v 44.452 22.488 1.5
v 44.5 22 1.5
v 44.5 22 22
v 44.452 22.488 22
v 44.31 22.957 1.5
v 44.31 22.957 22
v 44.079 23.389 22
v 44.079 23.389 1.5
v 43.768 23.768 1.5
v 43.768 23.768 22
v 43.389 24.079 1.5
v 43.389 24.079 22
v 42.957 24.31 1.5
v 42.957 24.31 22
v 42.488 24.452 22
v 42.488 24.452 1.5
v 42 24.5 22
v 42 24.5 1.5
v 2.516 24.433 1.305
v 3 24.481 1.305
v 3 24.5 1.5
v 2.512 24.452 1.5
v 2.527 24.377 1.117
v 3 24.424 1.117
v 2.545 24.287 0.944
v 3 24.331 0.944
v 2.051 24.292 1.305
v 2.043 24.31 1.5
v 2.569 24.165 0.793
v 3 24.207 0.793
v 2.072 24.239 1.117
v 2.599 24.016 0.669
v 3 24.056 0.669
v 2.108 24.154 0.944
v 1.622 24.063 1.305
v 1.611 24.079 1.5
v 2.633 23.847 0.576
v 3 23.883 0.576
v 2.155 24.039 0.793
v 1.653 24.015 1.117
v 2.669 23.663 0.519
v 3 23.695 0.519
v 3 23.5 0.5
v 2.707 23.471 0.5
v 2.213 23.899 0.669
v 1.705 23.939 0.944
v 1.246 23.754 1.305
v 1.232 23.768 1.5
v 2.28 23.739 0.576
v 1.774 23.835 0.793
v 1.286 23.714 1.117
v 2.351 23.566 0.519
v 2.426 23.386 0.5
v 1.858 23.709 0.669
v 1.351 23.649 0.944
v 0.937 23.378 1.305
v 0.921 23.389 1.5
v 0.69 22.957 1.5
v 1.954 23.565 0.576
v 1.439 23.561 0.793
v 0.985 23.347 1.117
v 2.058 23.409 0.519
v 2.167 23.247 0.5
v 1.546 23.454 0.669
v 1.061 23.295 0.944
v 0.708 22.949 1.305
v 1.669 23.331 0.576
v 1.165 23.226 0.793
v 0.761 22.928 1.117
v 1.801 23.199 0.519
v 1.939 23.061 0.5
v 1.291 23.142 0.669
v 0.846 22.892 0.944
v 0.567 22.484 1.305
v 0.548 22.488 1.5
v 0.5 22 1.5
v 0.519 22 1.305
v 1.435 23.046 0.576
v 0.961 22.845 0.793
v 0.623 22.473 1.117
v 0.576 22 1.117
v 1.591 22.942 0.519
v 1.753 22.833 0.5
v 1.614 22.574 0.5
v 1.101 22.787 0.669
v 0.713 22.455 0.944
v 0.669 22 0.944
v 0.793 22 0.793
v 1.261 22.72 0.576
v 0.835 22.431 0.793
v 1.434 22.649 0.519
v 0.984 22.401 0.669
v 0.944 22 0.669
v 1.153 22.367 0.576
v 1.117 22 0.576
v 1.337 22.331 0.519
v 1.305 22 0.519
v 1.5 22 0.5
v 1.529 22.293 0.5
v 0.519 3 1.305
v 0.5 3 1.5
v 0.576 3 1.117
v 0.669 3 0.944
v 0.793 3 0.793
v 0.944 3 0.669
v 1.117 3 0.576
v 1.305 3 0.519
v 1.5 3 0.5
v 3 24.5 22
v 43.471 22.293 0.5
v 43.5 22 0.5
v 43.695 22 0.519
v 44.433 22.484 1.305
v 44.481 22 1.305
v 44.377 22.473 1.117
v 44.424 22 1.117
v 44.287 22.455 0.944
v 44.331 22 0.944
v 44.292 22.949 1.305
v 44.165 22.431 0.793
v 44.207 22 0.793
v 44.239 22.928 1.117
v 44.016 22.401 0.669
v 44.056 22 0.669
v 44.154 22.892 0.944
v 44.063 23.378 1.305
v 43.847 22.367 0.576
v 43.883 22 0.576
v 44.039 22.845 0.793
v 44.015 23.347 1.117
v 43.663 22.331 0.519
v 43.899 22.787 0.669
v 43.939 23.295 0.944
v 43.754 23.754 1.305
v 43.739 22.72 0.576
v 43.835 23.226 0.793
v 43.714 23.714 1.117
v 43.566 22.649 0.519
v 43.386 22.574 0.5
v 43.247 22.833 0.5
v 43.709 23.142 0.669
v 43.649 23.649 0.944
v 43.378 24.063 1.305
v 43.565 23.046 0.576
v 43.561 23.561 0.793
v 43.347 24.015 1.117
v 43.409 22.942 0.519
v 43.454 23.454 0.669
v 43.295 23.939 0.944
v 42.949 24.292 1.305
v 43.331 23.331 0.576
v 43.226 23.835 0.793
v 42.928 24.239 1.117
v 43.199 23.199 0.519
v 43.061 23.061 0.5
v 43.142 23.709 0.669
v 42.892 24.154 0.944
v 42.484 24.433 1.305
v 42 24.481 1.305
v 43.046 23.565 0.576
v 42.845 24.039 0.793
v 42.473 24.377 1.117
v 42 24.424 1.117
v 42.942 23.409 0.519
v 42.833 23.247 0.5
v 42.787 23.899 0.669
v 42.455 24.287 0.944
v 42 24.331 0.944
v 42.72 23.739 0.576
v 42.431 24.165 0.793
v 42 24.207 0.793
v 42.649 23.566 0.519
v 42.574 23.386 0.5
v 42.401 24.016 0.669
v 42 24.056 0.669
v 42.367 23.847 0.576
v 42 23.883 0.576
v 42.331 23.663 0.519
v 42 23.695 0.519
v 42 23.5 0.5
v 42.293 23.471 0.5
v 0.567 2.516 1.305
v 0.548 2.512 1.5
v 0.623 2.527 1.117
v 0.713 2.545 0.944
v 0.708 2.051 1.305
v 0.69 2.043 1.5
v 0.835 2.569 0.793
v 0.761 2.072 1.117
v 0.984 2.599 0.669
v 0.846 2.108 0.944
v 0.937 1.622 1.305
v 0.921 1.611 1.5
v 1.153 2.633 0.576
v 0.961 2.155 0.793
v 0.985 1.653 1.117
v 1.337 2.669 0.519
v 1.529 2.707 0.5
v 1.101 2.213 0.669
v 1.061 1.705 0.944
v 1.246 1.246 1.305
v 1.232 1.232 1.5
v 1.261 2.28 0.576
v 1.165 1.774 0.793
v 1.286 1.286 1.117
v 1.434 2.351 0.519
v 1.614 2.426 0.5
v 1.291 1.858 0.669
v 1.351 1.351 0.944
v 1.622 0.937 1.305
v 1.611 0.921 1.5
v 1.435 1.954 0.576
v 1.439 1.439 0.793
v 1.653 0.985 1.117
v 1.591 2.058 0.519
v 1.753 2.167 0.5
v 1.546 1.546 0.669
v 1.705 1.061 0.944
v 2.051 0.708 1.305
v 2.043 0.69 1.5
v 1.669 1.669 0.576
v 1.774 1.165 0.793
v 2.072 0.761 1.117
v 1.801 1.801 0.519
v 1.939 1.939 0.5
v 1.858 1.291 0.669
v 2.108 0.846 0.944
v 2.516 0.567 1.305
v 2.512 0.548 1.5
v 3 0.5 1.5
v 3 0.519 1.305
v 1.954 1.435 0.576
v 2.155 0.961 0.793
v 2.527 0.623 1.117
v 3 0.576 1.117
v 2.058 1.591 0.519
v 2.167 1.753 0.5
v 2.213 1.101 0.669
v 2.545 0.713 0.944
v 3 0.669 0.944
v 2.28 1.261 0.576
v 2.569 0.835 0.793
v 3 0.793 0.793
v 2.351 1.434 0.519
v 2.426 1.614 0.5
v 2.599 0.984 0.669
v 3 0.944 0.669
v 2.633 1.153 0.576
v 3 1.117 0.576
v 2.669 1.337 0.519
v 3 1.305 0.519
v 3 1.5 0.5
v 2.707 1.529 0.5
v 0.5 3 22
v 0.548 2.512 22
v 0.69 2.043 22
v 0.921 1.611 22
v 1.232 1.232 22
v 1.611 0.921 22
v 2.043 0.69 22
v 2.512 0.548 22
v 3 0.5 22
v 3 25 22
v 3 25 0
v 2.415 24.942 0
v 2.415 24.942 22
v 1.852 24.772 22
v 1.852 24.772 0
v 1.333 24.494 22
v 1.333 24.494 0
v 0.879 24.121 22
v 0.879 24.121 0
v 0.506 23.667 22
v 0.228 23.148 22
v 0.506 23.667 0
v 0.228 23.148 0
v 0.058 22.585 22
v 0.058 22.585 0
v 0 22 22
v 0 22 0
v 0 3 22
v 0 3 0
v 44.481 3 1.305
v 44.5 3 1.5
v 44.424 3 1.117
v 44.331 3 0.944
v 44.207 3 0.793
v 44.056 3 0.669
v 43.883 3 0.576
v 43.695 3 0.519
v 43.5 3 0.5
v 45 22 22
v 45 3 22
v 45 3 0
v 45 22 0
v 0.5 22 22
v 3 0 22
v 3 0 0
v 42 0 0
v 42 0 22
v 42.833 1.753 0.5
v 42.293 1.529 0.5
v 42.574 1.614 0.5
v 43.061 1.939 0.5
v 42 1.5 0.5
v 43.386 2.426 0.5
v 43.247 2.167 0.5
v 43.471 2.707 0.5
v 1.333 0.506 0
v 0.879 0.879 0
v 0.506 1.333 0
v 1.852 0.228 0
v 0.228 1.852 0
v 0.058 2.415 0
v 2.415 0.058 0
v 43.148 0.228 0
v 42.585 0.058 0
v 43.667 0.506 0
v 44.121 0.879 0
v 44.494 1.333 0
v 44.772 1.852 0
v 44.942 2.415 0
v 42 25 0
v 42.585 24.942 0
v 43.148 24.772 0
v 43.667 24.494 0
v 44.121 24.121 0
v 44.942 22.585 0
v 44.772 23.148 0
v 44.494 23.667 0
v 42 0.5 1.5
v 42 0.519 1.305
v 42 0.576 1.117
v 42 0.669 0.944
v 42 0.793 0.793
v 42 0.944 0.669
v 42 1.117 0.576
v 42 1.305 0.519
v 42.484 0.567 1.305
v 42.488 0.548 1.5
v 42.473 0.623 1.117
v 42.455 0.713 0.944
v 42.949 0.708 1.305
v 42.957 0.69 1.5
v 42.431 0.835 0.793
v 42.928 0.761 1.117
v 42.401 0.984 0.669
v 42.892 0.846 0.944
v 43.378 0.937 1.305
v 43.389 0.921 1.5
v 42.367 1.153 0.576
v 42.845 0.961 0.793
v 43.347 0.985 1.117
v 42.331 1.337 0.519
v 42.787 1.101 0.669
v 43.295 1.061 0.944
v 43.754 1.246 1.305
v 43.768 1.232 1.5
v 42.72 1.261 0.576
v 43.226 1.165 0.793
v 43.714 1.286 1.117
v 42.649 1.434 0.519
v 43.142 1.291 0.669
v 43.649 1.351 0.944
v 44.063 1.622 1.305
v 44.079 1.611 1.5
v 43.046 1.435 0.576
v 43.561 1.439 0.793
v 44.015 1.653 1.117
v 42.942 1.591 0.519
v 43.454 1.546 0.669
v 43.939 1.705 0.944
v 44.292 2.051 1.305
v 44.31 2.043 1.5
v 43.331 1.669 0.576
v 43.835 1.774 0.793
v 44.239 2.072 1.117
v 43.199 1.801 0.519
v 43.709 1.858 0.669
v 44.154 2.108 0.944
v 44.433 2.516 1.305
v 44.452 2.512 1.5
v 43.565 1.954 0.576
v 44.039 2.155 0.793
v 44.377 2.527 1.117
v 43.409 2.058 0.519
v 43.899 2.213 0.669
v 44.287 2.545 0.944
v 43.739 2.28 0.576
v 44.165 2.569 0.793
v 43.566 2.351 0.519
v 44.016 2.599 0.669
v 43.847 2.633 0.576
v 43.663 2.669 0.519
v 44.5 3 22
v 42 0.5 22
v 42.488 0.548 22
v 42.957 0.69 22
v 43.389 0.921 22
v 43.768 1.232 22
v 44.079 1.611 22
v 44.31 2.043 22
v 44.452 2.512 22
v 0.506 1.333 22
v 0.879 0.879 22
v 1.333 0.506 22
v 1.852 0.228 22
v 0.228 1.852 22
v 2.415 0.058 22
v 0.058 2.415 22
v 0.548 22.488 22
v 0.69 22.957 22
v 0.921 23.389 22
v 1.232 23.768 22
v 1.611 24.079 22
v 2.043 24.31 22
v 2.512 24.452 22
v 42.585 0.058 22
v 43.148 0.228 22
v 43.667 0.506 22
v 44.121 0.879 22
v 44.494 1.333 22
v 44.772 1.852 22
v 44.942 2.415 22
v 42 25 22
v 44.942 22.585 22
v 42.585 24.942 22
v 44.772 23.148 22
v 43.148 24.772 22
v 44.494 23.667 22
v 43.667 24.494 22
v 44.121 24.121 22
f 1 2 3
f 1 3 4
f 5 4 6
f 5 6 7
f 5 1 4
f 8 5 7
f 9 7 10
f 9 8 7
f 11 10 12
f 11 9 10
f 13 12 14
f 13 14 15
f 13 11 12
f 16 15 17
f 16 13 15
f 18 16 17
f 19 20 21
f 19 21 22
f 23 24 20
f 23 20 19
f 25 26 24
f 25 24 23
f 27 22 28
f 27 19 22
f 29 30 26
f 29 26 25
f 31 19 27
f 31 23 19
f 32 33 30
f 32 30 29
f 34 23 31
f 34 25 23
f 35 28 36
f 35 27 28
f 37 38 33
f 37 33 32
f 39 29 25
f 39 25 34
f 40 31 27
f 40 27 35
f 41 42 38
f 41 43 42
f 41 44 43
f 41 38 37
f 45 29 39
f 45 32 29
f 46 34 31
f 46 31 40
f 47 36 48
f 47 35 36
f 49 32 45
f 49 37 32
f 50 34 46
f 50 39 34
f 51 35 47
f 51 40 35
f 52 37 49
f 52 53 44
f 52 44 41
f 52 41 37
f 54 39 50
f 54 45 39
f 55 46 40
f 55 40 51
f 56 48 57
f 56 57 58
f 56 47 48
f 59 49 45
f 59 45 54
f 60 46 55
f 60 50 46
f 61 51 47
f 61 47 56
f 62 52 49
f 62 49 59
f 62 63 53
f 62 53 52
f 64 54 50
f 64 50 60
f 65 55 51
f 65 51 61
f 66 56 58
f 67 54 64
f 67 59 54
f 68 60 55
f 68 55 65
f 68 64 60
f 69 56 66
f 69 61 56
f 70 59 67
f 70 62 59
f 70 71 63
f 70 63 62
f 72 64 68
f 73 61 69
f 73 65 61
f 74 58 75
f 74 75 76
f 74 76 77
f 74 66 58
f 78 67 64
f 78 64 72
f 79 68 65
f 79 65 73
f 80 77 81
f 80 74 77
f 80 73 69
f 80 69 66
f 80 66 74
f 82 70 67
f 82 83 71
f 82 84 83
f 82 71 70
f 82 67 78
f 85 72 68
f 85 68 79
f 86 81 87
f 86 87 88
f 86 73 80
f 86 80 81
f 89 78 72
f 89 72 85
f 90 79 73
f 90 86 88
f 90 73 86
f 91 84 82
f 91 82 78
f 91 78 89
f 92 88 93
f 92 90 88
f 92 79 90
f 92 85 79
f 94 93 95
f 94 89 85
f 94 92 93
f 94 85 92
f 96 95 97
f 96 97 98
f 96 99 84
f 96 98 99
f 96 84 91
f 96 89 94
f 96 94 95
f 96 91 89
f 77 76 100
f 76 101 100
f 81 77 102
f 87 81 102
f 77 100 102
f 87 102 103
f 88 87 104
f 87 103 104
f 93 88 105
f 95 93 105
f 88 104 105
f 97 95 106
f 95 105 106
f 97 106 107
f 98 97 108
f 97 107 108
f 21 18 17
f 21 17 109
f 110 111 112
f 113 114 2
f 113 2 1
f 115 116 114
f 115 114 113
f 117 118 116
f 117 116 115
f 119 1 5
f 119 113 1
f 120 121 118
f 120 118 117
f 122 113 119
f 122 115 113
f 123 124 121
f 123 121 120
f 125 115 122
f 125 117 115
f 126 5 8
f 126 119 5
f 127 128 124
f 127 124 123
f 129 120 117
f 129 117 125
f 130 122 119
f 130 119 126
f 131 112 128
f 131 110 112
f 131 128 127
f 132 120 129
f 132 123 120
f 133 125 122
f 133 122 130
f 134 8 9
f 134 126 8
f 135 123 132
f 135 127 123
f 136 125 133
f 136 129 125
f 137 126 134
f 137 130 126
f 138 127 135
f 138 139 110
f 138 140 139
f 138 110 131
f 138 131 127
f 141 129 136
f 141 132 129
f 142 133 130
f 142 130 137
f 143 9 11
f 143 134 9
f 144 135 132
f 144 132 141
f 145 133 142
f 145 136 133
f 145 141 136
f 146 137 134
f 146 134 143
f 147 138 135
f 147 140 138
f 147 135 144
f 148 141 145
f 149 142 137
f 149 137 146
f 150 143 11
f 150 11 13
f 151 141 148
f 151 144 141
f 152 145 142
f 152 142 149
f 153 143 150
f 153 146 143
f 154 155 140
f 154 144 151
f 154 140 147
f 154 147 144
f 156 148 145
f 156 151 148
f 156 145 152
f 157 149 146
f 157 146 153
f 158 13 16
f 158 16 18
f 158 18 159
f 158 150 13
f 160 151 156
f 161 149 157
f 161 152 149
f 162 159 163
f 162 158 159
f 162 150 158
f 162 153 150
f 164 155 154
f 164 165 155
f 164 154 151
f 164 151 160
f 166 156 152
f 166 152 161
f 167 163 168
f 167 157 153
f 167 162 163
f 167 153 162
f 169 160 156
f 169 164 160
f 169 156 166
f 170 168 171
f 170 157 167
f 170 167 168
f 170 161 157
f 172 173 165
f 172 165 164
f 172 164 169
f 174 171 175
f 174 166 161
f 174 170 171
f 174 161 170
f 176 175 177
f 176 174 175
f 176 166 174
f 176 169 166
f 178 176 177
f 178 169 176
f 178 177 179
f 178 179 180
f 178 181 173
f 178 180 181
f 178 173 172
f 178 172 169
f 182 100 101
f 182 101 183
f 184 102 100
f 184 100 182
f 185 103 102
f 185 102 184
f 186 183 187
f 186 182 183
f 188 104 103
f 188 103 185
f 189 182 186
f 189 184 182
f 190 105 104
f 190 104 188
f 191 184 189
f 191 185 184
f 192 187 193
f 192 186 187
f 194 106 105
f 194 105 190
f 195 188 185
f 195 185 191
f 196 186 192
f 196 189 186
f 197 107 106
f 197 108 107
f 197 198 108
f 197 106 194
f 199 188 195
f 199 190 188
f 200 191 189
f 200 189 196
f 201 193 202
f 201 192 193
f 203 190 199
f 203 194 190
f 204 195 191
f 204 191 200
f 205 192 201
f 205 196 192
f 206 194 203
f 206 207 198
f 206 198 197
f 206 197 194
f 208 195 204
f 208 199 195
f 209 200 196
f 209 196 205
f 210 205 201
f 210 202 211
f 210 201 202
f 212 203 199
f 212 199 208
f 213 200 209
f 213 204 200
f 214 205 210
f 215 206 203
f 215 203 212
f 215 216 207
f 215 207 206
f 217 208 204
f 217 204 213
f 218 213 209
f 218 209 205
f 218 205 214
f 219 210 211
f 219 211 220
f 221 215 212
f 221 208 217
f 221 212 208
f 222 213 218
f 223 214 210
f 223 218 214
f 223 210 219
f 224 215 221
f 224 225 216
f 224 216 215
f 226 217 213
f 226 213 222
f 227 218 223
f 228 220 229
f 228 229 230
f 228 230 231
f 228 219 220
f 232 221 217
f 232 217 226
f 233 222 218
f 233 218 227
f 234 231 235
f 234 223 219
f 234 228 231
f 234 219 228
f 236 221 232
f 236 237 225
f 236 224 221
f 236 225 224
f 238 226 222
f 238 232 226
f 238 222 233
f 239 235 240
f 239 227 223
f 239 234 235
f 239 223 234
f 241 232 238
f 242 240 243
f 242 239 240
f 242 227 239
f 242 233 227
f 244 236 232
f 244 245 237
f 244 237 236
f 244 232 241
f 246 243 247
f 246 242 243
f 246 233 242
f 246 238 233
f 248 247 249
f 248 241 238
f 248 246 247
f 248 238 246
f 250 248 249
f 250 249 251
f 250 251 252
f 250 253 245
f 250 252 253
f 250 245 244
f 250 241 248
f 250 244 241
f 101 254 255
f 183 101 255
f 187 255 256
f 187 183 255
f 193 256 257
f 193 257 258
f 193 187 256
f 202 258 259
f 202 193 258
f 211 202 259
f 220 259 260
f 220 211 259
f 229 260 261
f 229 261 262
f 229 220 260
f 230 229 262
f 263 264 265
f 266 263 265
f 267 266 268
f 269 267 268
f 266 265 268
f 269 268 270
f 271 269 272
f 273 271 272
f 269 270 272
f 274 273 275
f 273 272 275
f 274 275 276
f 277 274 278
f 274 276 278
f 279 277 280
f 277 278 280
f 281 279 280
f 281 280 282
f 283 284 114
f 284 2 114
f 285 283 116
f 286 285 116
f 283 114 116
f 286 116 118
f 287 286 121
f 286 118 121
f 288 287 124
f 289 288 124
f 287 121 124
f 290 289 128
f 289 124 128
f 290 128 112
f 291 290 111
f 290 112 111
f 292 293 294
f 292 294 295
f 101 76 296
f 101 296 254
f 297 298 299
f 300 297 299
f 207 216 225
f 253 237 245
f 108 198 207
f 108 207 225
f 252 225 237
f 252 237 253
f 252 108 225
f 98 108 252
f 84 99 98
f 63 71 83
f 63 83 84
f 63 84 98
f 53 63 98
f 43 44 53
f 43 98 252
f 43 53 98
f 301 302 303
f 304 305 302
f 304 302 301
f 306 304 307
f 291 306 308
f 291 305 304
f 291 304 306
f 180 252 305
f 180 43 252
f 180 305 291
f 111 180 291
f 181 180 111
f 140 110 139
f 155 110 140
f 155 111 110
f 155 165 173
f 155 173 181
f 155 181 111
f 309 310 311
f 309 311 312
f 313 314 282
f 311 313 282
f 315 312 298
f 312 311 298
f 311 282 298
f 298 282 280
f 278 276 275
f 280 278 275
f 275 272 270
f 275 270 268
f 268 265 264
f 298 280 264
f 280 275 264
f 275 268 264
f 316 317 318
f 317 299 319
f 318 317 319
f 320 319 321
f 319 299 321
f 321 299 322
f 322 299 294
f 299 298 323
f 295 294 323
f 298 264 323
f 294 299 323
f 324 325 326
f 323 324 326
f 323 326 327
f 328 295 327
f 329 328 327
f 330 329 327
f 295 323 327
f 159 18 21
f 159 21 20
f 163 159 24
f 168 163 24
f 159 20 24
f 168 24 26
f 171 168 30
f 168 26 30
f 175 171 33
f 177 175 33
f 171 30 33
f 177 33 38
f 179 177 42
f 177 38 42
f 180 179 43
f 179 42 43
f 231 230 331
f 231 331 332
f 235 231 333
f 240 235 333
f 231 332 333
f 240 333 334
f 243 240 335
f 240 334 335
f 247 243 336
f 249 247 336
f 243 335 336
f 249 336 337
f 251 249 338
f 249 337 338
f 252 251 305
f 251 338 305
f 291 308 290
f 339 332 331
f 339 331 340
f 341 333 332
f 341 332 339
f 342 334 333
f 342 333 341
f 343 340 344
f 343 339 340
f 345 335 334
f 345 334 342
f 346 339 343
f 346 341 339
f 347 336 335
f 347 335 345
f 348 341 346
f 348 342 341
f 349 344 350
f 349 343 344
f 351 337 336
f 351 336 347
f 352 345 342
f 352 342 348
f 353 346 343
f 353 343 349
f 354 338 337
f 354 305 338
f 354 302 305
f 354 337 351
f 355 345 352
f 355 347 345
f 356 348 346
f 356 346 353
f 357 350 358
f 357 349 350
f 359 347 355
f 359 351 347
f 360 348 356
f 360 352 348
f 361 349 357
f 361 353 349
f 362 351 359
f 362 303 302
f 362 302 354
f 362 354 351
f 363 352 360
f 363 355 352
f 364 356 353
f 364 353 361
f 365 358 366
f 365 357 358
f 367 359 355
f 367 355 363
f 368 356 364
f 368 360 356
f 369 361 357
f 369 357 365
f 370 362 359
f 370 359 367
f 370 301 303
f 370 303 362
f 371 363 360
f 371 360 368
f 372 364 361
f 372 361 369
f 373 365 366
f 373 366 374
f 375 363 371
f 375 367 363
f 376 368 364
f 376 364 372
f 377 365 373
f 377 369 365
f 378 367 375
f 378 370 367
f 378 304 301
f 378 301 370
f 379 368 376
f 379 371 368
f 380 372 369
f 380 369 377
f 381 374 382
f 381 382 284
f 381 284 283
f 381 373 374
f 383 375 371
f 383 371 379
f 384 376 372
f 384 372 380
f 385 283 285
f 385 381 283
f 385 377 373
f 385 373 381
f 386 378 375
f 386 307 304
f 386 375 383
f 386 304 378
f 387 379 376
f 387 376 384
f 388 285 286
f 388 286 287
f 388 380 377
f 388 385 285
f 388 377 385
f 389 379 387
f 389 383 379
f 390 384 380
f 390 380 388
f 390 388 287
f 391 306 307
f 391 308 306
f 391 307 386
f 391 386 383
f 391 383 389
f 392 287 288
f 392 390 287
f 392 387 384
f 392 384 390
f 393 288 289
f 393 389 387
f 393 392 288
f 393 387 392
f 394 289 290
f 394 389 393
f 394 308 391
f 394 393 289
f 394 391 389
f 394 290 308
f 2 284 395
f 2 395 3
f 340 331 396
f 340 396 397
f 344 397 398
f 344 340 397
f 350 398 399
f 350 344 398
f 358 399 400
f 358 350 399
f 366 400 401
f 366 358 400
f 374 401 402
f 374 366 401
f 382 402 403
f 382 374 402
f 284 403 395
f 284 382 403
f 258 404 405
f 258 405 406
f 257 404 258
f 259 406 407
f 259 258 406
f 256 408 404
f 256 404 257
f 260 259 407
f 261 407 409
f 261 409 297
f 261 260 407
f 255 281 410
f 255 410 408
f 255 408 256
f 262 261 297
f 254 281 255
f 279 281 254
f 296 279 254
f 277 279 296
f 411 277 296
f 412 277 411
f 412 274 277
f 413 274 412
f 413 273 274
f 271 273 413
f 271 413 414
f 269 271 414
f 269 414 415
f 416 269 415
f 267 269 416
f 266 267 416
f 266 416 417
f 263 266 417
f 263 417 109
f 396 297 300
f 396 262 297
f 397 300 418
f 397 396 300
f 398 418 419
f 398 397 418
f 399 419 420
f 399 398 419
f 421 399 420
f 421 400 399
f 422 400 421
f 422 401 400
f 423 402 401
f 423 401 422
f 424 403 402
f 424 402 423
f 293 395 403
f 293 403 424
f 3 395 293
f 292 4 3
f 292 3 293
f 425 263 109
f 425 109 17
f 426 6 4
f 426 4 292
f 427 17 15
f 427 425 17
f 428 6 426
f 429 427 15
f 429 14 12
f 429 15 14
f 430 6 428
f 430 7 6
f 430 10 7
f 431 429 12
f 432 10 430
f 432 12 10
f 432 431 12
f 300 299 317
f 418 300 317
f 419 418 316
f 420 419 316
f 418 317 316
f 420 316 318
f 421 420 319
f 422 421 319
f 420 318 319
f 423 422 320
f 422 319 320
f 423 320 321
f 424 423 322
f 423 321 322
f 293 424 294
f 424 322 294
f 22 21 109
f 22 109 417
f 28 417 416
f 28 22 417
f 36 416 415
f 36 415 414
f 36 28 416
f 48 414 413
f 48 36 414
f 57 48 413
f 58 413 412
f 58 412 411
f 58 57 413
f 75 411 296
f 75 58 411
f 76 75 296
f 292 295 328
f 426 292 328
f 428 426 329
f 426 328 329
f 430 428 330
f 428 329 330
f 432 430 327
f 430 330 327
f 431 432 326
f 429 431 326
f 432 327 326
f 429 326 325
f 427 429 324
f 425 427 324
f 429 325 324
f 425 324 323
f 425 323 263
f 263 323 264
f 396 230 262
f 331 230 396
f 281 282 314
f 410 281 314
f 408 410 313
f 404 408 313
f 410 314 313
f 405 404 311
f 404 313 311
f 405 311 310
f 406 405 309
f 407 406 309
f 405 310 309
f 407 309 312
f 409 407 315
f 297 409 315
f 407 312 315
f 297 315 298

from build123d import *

# Parameters (mm, degrees)
F1_DEPTH = 22
F2_T     = -0.5
F3_R     = 1


with BuildPart() as f1:
    # F0 (on Top) → F1 (new body)
    with BuildSketch(Plane.XY):
        with BuildLine():
            ThreePointArc((0, 3), (0.8786796564, 0.8786796564), (3, 0))
            Line((3, 0), (42, 0))
            ThreePointArc((42, 0), (44.1213203436, 0.8786796564), (45, 3))
            Line((45, 3), (45, 22))
            ThreePointArc((45, 22), (44.1213203436, 24.1213203436), (42, 25))
            Line((42, 25), (3, 25))
            ThreePointArc((3, 25), (0.8786796564, 24.1213203436), (0, 22))
            Line((0, 22), (0, 3))
        make_face()
    extrude(amount=F1_DEPTH)

    # F2
    f2_openings = [f1.faces().sort_by_distance(p)[0] for p in [
        (22.5, 12.5, 22),
    ]]
    offset(amount=F2_T, openings=f2_openings)

    # F3
    f3_edges = [f1.edges().sort_by_distance(p)[0] for p in [
        (0.5, 12.5, 0.5),
        (1.232233, 1.232233, 0.5),
        (22.5, 0.5, 0.5),
        (43.767767, 1.232233, 0.5),
        (44.5, 12.5, 0.5),
        (43.767767, 23.767767, 0.5),
        (22.5, 24.5, 0.5),
        (1.232233, 23.767767, 0.5),
    ]]
    fillet(f3_edges, radius=F3_R)


solid = f1.part
